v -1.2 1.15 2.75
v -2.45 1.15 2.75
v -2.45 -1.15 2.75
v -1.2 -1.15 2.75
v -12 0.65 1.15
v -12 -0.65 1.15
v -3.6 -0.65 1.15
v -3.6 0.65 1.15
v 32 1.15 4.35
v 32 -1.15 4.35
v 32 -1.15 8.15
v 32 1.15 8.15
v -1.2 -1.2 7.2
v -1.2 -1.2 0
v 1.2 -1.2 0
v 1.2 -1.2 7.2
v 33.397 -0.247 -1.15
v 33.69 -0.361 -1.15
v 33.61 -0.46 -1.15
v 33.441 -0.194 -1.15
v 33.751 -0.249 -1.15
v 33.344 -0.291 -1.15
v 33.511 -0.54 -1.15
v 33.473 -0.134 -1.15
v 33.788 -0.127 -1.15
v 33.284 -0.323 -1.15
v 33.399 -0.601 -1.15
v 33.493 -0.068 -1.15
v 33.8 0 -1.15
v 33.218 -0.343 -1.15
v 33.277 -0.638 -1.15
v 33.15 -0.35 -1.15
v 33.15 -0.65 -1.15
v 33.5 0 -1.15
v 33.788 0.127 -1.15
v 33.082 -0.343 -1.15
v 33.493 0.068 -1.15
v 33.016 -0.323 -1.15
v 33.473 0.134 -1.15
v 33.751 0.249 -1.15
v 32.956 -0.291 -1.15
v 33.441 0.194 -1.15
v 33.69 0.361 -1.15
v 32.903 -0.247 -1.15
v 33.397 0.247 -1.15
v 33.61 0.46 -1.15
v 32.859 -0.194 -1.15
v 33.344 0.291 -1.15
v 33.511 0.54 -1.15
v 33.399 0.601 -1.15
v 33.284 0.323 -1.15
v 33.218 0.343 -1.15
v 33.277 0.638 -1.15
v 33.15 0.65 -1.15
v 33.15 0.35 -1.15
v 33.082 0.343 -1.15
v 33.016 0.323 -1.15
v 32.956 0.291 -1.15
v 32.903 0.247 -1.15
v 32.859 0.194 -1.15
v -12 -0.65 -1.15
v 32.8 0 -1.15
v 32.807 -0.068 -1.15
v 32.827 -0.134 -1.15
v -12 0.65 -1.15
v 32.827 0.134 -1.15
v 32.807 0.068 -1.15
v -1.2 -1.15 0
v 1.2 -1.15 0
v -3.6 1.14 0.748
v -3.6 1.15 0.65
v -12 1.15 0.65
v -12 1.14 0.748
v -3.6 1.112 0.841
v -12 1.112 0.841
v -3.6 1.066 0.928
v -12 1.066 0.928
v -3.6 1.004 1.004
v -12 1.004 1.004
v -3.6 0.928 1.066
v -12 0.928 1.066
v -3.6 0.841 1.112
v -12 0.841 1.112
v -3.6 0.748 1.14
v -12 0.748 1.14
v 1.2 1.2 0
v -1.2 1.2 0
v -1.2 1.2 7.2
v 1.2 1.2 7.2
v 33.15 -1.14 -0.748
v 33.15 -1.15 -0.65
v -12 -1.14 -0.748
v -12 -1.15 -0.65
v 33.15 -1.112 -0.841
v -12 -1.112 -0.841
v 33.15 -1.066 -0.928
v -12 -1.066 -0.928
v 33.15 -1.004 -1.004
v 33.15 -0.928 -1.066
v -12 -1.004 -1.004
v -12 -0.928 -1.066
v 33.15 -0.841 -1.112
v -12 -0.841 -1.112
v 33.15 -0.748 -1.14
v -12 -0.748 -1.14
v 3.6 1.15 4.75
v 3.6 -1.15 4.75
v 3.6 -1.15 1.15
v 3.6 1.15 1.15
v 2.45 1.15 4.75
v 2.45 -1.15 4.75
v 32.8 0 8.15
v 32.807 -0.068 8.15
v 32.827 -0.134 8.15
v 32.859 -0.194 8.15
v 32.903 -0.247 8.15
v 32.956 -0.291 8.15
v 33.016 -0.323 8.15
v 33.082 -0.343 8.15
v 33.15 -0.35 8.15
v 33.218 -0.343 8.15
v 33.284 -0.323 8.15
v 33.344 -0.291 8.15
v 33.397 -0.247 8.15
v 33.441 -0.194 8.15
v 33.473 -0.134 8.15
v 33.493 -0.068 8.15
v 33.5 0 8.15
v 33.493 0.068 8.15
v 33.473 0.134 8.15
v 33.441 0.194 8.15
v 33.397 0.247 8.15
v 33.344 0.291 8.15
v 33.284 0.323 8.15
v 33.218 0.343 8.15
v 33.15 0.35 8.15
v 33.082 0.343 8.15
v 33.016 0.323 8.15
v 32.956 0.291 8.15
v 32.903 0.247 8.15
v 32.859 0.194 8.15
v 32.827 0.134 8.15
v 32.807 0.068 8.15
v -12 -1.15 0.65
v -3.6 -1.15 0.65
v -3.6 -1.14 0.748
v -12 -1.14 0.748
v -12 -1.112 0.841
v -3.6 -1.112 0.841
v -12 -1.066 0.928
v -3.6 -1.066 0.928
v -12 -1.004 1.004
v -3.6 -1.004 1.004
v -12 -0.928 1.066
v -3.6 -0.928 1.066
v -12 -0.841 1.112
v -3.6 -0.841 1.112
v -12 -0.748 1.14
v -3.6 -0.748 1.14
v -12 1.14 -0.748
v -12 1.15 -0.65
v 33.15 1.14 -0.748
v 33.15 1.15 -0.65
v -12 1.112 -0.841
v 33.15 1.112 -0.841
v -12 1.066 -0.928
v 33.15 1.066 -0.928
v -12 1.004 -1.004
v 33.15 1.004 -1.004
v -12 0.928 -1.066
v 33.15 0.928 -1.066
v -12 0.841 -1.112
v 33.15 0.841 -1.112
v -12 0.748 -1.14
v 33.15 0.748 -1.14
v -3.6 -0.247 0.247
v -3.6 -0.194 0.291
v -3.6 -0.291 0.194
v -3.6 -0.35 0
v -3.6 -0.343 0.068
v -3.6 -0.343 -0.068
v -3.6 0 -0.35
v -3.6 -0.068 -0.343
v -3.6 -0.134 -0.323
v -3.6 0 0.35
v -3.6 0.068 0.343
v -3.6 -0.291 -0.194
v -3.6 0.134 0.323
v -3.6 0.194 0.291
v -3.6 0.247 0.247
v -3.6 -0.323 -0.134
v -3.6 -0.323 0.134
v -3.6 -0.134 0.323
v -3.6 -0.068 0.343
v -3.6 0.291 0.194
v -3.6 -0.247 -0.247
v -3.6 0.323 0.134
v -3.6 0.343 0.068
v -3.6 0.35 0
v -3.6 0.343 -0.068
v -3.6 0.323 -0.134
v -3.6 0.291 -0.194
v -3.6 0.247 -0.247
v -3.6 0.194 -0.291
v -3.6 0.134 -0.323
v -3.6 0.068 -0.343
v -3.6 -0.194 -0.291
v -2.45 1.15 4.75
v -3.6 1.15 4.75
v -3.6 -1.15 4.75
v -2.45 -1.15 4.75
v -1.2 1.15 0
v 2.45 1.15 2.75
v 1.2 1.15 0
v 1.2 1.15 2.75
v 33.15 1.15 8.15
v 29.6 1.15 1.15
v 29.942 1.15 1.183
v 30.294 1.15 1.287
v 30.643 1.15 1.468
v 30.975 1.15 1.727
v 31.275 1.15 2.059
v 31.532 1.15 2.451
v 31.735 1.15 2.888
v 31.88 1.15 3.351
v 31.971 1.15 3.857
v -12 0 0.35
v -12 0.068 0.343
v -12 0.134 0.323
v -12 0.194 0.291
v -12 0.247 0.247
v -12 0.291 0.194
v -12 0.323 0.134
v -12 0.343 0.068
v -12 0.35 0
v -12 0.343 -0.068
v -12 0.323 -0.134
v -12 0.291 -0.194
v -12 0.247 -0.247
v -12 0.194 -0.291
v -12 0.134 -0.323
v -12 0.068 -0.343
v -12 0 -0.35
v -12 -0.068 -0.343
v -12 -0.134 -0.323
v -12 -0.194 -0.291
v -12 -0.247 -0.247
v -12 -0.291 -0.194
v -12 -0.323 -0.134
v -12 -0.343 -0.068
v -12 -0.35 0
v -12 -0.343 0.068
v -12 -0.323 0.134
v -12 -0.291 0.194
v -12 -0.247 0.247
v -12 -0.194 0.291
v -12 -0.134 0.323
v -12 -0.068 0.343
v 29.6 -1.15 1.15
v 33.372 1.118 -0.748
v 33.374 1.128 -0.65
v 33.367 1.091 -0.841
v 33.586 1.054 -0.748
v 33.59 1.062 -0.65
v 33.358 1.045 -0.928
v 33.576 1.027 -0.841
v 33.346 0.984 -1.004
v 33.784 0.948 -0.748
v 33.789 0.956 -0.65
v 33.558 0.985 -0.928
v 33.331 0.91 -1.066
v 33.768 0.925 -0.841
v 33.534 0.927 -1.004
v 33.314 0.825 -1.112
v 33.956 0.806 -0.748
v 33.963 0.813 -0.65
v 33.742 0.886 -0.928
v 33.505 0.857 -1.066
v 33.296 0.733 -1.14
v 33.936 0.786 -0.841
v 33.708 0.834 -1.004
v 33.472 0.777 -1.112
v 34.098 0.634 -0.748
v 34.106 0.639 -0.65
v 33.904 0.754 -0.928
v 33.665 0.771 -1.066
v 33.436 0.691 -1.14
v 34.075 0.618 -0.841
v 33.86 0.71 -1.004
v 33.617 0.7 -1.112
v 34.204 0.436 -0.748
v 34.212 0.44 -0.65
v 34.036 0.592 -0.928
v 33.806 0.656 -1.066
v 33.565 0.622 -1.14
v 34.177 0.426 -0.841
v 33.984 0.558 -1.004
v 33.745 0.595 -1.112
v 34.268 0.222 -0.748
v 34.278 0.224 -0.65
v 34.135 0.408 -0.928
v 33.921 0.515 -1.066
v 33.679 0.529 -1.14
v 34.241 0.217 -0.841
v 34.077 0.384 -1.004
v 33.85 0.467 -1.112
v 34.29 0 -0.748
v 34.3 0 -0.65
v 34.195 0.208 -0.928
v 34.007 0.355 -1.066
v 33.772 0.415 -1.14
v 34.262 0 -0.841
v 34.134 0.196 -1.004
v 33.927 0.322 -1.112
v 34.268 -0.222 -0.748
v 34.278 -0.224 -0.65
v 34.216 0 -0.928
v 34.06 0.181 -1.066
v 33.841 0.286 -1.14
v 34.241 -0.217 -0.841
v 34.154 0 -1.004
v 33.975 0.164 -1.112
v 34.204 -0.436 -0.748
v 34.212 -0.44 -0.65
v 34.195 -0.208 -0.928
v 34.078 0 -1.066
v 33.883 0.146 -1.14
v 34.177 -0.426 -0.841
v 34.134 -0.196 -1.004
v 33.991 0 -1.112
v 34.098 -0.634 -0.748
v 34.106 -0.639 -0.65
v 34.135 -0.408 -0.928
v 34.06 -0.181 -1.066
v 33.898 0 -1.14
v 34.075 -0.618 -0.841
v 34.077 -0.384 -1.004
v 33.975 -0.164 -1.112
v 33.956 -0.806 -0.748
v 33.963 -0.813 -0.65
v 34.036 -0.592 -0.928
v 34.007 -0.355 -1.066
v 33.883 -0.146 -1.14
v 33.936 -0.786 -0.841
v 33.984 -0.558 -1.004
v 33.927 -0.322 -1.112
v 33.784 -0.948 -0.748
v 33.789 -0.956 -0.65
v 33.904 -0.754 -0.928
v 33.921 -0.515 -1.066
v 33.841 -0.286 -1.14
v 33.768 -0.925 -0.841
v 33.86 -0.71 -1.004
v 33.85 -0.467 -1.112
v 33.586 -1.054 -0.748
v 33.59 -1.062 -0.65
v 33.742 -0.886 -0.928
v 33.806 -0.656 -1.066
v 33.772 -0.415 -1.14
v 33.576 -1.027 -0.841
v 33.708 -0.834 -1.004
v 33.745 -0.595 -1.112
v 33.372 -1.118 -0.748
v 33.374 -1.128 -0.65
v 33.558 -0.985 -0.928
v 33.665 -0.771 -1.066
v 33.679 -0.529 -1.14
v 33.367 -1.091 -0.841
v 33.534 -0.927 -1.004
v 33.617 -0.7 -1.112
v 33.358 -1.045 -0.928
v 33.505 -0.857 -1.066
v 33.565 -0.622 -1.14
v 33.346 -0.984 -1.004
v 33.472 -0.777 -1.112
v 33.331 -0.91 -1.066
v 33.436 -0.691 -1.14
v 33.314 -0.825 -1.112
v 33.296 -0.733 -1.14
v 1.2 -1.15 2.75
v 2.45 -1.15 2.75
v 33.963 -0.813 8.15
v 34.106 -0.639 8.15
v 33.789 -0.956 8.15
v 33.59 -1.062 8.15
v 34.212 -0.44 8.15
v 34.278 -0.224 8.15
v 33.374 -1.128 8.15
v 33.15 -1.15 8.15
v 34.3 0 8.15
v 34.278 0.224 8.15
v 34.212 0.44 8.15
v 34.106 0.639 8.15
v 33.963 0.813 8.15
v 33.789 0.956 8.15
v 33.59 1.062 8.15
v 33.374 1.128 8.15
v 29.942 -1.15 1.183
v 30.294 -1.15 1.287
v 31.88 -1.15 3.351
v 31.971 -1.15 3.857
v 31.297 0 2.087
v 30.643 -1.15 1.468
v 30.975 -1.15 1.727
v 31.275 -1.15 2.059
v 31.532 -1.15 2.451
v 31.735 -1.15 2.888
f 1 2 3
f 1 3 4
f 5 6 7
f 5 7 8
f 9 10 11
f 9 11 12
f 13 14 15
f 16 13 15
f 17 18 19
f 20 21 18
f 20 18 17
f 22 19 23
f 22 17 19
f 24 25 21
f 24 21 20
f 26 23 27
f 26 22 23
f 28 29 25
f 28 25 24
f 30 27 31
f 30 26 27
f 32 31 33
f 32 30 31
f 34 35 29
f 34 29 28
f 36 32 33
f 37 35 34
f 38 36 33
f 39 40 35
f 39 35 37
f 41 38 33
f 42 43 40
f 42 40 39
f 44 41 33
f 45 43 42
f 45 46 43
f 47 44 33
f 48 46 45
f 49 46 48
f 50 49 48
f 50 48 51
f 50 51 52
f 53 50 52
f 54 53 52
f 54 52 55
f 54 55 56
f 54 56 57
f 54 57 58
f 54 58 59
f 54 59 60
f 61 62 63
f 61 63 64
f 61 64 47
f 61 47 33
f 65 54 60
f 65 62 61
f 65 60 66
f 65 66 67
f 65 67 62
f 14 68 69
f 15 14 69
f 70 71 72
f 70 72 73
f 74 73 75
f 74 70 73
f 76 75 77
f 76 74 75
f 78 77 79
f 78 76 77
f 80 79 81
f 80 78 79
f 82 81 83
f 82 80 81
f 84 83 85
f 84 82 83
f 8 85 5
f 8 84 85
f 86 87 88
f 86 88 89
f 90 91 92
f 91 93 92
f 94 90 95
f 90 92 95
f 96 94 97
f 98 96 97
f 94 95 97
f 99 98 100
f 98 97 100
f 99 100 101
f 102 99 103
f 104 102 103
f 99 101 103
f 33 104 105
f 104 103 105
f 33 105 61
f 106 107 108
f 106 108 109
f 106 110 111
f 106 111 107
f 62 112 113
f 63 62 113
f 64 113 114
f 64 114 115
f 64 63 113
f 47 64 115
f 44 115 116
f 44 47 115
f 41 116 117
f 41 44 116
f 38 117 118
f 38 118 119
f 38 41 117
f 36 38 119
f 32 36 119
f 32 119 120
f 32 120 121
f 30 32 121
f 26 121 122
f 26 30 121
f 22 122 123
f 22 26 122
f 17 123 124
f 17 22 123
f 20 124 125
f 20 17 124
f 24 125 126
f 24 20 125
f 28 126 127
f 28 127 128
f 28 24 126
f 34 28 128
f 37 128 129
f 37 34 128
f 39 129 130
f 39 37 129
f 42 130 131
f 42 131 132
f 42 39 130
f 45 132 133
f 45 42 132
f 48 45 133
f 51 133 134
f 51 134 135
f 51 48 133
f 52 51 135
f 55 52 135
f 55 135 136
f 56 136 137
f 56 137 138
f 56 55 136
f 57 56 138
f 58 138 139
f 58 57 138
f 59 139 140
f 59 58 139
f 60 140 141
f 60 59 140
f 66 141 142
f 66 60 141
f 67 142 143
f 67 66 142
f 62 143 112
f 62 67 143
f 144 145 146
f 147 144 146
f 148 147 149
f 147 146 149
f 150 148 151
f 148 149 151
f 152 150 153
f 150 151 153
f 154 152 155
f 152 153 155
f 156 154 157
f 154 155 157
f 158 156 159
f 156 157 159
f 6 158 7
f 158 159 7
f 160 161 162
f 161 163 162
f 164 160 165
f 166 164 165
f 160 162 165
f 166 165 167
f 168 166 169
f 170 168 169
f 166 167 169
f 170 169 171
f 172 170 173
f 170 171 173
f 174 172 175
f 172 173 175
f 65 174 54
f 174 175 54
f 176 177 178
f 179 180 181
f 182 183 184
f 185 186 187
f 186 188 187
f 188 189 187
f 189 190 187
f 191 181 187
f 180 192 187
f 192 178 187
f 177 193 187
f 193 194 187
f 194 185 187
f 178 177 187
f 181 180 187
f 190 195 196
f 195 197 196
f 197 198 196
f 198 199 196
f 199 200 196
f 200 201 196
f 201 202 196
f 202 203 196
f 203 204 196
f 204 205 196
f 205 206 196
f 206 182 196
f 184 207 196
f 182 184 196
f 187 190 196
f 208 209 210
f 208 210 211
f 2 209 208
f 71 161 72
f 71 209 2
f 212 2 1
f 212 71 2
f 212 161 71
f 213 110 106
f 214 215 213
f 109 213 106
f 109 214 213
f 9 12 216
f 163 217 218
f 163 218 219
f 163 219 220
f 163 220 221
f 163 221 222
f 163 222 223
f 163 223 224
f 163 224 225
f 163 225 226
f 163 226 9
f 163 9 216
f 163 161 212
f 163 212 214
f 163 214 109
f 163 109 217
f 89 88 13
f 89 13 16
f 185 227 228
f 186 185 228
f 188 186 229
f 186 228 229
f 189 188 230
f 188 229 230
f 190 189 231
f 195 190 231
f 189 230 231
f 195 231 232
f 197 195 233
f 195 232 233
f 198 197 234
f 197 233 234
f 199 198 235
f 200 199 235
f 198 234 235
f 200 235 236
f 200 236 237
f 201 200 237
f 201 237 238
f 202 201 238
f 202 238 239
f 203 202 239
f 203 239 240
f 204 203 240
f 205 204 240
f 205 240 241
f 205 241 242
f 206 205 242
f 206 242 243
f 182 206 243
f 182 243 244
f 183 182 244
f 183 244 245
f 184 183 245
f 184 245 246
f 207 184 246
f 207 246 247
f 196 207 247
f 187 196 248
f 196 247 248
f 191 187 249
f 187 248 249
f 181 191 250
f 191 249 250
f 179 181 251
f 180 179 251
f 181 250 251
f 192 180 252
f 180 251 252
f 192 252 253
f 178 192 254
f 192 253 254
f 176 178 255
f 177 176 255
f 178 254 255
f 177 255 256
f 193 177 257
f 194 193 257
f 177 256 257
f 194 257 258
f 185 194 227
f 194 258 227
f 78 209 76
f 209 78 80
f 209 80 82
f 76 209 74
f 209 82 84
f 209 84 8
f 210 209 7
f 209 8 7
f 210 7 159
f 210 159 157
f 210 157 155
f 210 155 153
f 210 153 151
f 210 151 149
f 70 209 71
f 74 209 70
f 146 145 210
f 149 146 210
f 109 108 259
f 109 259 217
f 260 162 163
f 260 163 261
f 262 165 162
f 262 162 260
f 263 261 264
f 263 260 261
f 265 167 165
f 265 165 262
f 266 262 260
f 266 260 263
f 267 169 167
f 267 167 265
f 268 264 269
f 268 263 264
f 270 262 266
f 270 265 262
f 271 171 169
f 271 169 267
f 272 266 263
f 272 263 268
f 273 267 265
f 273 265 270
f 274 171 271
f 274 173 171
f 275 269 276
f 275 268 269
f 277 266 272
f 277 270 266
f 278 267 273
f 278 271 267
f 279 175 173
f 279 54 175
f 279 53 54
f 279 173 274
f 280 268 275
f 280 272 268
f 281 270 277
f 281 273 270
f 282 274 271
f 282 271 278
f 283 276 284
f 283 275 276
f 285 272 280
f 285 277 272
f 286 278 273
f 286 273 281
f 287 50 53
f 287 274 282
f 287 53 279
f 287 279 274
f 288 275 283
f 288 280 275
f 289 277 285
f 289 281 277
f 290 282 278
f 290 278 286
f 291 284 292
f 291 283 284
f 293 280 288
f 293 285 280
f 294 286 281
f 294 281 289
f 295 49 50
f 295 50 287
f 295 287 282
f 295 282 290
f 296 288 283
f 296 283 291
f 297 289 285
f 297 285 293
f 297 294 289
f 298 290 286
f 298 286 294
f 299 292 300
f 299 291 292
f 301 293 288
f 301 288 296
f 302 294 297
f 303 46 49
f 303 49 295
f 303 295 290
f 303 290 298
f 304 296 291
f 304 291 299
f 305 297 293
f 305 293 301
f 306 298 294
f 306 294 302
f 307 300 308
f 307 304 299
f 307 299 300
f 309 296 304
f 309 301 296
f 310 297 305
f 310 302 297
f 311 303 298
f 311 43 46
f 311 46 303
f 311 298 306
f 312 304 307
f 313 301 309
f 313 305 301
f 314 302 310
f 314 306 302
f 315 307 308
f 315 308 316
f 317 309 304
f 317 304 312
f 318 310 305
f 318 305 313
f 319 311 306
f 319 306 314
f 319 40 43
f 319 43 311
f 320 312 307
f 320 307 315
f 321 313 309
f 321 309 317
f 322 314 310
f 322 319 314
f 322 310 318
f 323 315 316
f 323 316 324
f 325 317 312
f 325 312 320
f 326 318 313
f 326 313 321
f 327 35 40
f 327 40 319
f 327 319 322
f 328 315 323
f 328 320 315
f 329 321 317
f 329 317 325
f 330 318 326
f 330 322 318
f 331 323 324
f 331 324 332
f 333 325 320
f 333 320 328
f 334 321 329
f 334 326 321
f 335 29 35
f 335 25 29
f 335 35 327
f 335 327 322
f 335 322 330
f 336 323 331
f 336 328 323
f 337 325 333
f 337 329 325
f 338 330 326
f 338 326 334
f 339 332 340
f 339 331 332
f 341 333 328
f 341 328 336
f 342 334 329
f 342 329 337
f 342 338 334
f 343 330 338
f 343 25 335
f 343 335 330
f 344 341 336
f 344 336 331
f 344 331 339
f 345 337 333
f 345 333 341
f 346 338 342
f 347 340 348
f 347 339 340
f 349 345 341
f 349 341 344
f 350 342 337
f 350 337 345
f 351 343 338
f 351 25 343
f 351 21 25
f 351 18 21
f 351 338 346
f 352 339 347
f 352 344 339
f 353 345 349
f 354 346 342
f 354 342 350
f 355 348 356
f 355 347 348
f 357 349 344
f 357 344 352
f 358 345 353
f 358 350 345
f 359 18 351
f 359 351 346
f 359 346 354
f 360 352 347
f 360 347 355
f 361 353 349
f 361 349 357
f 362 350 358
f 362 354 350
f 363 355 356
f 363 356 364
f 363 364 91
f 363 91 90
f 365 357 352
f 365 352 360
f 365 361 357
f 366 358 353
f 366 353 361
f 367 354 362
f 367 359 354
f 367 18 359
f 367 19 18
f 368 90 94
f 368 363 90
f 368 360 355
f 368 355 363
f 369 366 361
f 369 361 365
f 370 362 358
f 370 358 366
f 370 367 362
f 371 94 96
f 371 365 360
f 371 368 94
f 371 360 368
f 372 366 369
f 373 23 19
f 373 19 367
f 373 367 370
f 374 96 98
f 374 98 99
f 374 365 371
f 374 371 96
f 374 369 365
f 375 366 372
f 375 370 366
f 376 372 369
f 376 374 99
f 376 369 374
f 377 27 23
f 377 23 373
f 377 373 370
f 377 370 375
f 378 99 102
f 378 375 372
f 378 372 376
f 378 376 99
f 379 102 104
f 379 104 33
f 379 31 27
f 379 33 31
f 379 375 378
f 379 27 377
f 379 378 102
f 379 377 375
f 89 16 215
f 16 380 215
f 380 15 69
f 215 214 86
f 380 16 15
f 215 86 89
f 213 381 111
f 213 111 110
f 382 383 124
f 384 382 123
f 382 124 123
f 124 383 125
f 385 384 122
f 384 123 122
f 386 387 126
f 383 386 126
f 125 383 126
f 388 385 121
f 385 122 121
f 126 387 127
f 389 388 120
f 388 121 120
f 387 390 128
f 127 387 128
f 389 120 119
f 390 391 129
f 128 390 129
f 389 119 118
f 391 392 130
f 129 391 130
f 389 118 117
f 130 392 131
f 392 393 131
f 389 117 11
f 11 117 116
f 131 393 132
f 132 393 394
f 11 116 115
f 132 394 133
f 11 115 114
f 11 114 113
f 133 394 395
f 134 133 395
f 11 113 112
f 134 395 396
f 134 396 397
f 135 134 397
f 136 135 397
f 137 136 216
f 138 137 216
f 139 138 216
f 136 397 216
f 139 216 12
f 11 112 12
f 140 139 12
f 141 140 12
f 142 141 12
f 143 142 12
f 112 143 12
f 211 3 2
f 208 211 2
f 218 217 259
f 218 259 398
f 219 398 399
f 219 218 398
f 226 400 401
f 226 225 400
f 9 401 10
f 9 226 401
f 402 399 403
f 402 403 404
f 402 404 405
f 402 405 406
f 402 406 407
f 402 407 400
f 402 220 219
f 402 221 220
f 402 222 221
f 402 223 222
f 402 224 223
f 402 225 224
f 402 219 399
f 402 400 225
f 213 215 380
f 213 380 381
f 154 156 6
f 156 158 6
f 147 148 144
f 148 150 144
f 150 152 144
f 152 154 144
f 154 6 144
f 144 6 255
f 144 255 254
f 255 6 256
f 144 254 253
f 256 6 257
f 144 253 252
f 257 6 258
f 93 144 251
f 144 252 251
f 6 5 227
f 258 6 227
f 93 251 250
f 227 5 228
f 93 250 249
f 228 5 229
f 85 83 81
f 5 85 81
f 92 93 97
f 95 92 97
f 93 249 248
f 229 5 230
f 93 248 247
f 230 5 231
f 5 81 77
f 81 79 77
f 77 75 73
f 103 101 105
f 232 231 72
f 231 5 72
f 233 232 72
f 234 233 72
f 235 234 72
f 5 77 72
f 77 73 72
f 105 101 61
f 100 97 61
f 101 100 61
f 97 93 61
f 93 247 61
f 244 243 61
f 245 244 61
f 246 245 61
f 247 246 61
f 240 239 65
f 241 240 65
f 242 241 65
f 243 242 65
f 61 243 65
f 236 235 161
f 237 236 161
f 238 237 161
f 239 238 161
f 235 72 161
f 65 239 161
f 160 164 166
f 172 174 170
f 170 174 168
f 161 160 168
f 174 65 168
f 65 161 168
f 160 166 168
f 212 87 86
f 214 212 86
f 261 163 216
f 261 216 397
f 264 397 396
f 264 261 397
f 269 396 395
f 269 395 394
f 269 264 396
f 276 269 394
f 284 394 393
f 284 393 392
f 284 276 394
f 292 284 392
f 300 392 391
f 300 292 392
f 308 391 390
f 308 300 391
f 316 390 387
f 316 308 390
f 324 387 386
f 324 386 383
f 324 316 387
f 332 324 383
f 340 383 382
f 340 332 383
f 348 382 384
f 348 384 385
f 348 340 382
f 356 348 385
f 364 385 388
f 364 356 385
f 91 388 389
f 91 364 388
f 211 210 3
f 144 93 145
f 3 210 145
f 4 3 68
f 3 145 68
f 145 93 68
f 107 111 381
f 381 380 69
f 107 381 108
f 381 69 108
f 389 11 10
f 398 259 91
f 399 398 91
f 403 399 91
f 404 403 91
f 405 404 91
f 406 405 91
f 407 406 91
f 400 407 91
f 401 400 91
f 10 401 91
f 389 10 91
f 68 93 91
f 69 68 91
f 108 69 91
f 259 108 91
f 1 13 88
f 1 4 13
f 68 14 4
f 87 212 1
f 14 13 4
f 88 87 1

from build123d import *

# Parameters (mm, degrees)
SKETCH_1_W           = 2.4
SKETCH_1_H           = 2.4
EXTRUDE_1_DEPTH      = 7.2
EXTRUDE_2_DEPTH      = 32
EXTRUDE_2_DEPTH_BACK = 12
SKETCH_4_W           = 2.3
SKETCH_4_H           = 2.3
EXTRUDE_3_DEPTH      = 7
EXTRUDE_3_DEPTH_BACK = 2.3
SKETCH_5_R           = 0.35
SKETCH_6_R           = 0.35
CUT_EXTRUDE_1_DEPTH  = 10
FILLET_1_SIZE        = 2.4
FILLET_1_SIZE_2      = 3.2
FILLET_2_R           = 0.5
EXTRUDE_START        = -1.5
SKETCH_7_W           = 1.15
SKETCH_7_H           = 0.5
SKETCH_7_H_2         = 1.3
SKETCH_7_H_3         = 2.3
EXTRUDE_4_DEPTH      = 5.1
SKETCH_8_W           = 7.2
SKETCH_8_H           = 2.3
EXTRUDE_5_DEPTH      = 3.1


with BuildPart() as part:
    # 草图1 → 凸台-拉伸1 (new body)
    with BuildSketch(Plane.XY):
        Rectangle(SKETCH_1_W, SKETCH_1_H)
    extrude(amount=EXTRUDE_1_DEPTH)

    # 草图4 → 凸台-拉伸2 (add, two sides: drawn at the far end of the back side and taken through both)
    with BuildSketch(Plane(origin=(0, 0, 0), x_dir=(0, 0, -1), z_dir=(1, 0, 0)).offset(-EXTRUDE_2_DEPTH_BACK)):
        Rectangle(SKETCH_4_W, SKETCH_4_H)
    extrude(amount=EXTRUDE_2_DEPTH + EXTRUDE_2_DEPTH_BACK)

    # 草图5 → 凸台-拉伸3 (add, two sides: drawn at the far end of the back side and taken through both)
    with BuildSketch(Plane.XY.offset(1.15).offset(-EXTRUDE_3_DEPTH_BACK)):
        with BuildLine():
            Line((32, 0), (32, 1.15))
            Line((32, 1.15), (33.15, 1.15))
            ThreePointArc((33.15, 1.15), (34.3, 0), (33.15, -1.15))
            Line((33.15, -1.15), (32, -1.15))
            Line((32, -1.15), (32, 0))
        make_face()
        with Locations(Location((33.15, 0, 0), (0, 0, 180))):
            Circle(SKETCH_5_R, mode=Mode.SUBTRACT)
    extrude(amount=EXTRUDE_3_DEPTH + EXTRUDE_3_DEPTH_BACK)

    # 草图6 → 切除-拉伸1 (cut)
    with BuildSketch(Plane.ZY.offset(12)):
        Circle(SKETCH_6_R)
    extrude(amount=-CUT_EXTRUDE_1_DEPTH, mode=Mode.SUBTRACT)

    # 圆角1
    # an asymmetric fillet: 3.2, 2.4 mm, written as the material it adds along each edge
    with BuildSketch(Plane(origin=(32, 1.15, 1.15), x_dir=(-1, 0, 0), z_dir=(0, -1, 0))) as fillet_1_piece_1:
        with BuildLine():
            Bezier((FILLET_1_SIZE, 0), (0, 0), (0, -FILLET_1_SIZE_2), weights=[1, 0.707106781, 1])
            Line((0, -FILLET_1_SIZE_2), (0, 0))
            Line((0, 0), (FILLET_1_SIZE, 0))
        make_face()
    extrude(amount=2.3)

    # 圆角2
    fillet_2_edges = [part.edges().sort_by_distance(p)[0] for p in [
        (-6.6, -1.15, 1.15),
        (10.575, -1.15, -1.15),
        (-6.6, 1.15, 1.15),
        (10.575, 1.15, -1.15),
        (34.3, 0, -1.15),
    ]]
    fillet(fillet_2_edges, radius=FILLET_2_R)

    # 草图7 → 凸台-拉伸4 (add)
    with BuildSketch(Plane.XY.offset(1.15).offset(EXTRUDE_START)):
        with Locations((-3.025, 0.9)):
            Rectangle(SKETCH_7_W, SKETCH_7_H)
        with Locations((-3.025, 0)):
            Rectangle(SKETCH_7_W, SKETCH_7_H_2)
        with Locations((-3.025, -0.9)):
            Rectangle(SKETCH_7_W, SKETCH_7_H)
        with Locations((3.025, 0)):
            Rectangle(SKETCH_7_W, SKETCH_7_H_3)
    extrude(amount=EXTRUDE_4_DEPTH)

    # 草图8 → 凸台-拉伸5 (add)
    with BuildSketch(Plane.XY.offset(1.15).offset(EXTRUDE_START)):
        Rectangle(SKETCH_8_W, SKETCH_8_H)
    extrude(amount=EXTRUDE_5_DEPTH)


solid = part.part
